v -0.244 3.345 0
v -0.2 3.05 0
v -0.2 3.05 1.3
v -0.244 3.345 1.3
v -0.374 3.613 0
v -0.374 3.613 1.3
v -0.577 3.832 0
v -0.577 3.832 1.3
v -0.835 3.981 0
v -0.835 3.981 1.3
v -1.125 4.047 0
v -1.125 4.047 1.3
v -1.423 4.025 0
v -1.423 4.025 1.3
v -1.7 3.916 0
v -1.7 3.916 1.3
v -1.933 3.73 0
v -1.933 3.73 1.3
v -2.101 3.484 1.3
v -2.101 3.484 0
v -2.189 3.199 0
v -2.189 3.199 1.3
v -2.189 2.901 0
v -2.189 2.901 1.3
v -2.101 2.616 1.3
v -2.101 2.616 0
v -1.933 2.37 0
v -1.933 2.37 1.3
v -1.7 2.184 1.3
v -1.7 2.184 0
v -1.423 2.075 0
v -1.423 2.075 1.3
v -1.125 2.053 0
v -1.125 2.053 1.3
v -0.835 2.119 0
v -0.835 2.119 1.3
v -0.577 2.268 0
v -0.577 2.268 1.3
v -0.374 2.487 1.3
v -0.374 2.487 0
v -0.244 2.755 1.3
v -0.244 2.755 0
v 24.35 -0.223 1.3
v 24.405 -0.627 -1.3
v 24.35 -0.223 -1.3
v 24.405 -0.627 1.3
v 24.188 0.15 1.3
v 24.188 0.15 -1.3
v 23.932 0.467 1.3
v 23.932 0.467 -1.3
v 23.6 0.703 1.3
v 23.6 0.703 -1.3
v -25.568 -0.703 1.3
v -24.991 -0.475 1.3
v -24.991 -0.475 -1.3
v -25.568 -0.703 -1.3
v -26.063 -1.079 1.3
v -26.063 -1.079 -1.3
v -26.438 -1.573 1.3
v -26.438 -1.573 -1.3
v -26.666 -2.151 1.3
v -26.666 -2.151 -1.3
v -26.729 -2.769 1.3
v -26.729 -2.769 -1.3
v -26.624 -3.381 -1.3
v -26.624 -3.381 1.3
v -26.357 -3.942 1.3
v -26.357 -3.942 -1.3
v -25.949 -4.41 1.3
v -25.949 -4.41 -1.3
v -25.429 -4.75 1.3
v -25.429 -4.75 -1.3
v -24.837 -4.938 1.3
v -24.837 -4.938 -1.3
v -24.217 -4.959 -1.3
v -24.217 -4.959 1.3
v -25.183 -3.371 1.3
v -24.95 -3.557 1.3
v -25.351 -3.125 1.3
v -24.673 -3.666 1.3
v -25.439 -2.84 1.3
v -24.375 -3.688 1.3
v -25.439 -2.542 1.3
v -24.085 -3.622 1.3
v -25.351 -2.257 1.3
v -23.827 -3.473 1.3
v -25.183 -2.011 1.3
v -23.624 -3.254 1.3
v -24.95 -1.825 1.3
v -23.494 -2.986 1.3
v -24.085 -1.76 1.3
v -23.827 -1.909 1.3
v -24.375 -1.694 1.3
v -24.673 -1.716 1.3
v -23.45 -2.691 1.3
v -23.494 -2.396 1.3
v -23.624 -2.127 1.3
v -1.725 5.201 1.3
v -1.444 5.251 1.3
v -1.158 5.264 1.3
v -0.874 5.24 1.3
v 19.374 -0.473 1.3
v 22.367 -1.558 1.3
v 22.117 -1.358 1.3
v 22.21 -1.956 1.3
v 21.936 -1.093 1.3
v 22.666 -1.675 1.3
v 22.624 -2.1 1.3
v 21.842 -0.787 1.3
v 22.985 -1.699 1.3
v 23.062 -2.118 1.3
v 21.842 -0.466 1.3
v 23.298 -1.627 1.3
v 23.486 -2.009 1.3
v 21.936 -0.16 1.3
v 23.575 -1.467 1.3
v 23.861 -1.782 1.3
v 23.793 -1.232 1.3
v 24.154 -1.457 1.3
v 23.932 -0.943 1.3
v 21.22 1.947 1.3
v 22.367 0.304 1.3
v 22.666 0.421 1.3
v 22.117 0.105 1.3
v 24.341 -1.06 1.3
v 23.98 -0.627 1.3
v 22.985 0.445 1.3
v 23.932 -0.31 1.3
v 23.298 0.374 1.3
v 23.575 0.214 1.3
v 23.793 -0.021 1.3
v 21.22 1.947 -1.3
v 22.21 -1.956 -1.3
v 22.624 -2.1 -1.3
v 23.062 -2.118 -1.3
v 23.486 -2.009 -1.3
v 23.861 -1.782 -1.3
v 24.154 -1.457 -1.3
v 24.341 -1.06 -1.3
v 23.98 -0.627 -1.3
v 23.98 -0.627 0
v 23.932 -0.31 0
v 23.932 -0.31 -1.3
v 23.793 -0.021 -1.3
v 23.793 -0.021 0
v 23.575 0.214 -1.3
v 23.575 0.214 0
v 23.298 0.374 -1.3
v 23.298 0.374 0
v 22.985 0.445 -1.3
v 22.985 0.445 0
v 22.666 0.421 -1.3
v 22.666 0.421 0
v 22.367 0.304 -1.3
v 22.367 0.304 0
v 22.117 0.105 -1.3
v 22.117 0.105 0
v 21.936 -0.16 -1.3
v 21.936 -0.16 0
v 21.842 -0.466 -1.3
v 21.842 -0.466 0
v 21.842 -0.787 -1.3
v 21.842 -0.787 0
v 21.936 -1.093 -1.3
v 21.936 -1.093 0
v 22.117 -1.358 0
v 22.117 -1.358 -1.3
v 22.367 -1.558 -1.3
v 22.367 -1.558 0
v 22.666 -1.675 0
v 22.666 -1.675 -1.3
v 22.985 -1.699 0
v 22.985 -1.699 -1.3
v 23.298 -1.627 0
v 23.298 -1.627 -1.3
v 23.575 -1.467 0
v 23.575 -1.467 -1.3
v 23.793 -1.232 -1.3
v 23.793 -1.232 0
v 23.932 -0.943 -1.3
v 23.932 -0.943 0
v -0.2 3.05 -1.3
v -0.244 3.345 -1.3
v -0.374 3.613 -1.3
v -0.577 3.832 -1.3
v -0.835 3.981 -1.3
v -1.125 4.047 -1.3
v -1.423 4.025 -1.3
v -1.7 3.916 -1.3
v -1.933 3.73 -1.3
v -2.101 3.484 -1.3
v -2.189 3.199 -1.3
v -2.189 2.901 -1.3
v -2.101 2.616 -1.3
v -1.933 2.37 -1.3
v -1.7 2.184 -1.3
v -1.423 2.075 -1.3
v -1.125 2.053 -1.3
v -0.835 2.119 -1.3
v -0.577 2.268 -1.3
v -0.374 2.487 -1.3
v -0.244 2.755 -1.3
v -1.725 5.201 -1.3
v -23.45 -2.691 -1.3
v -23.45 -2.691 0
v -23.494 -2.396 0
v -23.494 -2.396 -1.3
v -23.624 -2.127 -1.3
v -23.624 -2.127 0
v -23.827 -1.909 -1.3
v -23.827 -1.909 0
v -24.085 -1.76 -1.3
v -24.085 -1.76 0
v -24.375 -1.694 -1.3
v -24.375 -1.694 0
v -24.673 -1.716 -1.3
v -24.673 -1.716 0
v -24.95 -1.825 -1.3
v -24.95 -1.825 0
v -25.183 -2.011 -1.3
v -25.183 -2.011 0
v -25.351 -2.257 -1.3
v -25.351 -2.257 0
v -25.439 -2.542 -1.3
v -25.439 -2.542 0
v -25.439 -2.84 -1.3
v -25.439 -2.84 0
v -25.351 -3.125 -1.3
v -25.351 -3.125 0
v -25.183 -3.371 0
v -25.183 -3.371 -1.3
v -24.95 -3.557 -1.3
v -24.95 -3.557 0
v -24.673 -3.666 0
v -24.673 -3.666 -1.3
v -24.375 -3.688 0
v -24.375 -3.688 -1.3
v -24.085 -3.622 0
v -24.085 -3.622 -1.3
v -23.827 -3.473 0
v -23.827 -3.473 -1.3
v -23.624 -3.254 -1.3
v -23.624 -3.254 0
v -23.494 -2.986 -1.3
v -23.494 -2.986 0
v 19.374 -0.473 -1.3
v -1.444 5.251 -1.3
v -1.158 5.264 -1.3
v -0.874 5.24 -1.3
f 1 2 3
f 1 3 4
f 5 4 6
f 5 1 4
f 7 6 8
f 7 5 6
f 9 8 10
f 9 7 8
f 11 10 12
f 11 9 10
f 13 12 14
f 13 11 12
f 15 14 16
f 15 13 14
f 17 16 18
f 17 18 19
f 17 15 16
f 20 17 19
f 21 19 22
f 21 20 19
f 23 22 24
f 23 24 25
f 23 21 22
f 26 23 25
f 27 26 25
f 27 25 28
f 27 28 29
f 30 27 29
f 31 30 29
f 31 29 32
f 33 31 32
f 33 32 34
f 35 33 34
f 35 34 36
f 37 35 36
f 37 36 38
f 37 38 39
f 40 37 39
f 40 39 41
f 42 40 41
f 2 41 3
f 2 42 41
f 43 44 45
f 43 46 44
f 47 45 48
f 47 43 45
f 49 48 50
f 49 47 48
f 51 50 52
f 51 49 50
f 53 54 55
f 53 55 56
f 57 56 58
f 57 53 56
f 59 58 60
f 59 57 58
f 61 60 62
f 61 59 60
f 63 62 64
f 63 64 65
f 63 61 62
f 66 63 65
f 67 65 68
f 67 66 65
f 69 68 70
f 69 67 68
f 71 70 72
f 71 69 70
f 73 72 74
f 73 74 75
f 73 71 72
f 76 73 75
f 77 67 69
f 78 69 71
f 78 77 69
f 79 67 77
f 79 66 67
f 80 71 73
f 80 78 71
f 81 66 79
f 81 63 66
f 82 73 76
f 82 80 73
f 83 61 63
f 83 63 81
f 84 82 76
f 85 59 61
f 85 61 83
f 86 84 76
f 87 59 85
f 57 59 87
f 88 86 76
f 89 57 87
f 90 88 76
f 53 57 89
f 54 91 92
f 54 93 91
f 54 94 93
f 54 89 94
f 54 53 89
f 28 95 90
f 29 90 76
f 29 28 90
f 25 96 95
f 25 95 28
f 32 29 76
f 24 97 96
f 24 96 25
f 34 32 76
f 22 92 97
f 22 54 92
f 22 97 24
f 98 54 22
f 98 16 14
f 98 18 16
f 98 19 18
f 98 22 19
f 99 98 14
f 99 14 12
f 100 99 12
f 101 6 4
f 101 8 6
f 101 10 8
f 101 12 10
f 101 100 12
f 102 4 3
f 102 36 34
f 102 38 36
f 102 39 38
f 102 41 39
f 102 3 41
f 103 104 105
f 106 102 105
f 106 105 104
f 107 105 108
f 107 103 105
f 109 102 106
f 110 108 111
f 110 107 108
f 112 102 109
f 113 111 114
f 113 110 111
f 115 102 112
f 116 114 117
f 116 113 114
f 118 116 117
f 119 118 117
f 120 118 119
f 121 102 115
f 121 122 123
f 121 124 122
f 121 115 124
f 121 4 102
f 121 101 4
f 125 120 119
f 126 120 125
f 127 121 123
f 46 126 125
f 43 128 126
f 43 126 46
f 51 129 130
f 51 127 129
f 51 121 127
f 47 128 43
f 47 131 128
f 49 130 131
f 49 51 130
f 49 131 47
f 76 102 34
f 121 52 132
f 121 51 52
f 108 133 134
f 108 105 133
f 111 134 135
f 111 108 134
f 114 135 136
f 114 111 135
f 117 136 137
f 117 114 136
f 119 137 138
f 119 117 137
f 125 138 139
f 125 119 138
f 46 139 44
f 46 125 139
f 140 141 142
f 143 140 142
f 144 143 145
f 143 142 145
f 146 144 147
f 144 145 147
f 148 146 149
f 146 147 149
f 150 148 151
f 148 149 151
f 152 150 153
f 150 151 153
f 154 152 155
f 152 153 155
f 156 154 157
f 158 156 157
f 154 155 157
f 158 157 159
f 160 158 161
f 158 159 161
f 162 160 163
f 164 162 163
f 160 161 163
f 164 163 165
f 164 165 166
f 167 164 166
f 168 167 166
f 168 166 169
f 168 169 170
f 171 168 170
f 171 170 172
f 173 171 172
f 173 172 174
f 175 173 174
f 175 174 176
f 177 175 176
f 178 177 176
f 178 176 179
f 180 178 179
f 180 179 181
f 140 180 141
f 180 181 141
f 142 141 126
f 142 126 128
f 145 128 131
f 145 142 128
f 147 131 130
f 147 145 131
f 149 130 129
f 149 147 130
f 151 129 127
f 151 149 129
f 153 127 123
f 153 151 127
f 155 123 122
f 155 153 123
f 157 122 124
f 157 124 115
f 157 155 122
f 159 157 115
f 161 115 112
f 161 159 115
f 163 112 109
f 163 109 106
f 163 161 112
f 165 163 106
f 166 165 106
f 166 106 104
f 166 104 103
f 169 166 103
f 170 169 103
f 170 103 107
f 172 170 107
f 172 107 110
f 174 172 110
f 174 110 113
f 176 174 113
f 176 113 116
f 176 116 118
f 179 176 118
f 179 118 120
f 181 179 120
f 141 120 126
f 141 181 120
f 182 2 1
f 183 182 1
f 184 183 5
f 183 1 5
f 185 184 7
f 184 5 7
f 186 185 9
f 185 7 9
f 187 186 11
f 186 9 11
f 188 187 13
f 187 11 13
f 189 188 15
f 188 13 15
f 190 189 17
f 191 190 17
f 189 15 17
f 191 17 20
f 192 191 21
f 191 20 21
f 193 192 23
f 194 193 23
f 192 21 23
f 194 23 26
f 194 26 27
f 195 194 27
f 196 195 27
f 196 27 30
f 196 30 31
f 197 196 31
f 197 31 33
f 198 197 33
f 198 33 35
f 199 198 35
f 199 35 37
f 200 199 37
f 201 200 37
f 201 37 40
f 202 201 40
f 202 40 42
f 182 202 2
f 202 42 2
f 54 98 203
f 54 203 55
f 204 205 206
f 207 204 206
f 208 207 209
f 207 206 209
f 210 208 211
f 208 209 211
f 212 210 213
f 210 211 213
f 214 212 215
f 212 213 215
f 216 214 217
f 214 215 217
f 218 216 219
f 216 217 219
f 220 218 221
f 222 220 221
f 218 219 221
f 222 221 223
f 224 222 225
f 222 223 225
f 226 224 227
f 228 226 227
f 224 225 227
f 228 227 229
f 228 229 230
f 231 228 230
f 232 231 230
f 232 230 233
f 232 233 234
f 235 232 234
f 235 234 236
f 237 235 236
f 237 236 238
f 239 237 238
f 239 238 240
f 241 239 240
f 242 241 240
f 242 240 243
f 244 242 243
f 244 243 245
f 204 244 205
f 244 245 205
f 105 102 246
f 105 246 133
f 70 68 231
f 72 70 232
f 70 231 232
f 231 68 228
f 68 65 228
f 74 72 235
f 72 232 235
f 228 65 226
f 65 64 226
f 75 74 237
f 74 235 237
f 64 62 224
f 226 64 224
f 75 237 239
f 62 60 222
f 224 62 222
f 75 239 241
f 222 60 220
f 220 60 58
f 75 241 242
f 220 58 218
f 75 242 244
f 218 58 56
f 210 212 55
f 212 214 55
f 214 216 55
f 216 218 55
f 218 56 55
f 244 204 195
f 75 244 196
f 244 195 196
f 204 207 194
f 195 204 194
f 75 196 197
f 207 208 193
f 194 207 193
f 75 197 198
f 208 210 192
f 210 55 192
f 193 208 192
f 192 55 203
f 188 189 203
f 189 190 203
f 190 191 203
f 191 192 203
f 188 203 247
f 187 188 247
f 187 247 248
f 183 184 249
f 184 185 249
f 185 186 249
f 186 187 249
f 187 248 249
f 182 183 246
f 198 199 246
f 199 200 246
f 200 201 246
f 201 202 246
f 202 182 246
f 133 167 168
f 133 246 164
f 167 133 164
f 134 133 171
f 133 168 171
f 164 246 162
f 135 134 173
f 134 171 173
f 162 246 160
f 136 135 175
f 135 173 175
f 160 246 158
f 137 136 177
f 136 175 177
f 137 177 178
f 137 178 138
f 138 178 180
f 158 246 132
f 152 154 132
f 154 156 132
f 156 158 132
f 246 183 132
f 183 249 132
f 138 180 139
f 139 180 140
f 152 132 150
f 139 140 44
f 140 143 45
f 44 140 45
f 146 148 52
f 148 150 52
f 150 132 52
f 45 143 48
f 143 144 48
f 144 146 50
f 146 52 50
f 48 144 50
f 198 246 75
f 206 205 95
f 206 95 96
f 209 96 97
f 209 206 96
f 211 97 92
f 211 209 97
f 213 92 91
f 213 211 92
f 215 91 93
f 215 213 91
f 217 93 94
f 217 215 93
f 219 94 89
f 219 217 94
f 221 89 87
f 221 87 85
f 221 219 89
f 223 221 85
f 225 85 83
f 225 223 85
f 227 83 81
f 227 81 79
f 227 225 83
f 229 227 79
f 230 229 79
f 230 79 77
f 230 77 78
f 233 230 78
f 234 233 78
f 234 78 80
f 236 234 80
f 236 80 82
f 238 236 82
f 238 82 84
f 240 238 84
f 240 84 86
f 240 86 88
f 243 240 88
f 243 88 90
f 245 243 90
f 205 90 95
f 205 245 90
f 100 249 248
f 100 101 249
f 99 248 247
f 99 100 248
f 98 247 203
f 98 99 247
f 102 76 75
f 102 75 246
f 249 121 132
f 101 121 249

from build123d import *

# Parameters (mm, degrees)
F0_R     = 1
F0_R_2   = 1.075
F1_DEPTH = 1.3


with BuildPart() as f1:
    # F0 (on Top) → F1 (new body)
    with BuildSketch(Plane.XY):
        with BuildLine():
            ThreePointArc((-1.724839, 5.20118), (-2.567642, 1.308568), (1.014279, 3.05))
            ThreePointArc((1.014279, 3.05), (0.477178, 4.49572), (-0.873565, 5.240085))
            ThreePointArc((-0.873565, 5.240085), (-1.301091, 5.26197), (-1.724839, 5.20118))
        make_face()
        with Locations((-1.2, 3.05)):
            Circle(F0_R, mode=Mode.SUBTRACT)
        with BuildLine():
            ThreePointArc((-0.873565, 5.240085), (0.477178, 4.49572), (1.014279, 3.05))
            ThreePointArc((1.014279, 3.05), (-2.567642, 1.308568), (-1.724839, 5.20118))
            Line((-1.724839, 5.20118), (-24.990567, -0.475129))
            ThreePointArc((-24.990567, -0.475129), (-23.041374, -0.897155), (-22.169366, -2.690773))
            ThreePointArc((-22.169366, -2.690773), (-22.75681, -4.218646), (-24.216514, -4.959423))
            Line((-24.216514, -4.959423), (19.374011, -0.473151))
            Line((19.374011, -0.473151), (22.209785, -1.955847))
            ThreePointArc((22.209785, -1.955847), (21.57553, 0.068436), (23.599812, 0.702691))
            Line((23.599812, 0.702691), (21.219947, 1.947013))
            Line((21.219947, 1.947013), (-0.873565, 5.240085))
        make_face()
        with BuildLine():
            ThreePointArc((-22.169366, -2.690773), (-23.041374, -0.897155), (-24.990567, -0.475129))
            ThreePointArc((-24.990567, -0.475129), (-26.697398, -3.078706), (-24.216514, -4.959423))
            ThreePointArc((-24.216514, -4.959423), (-22.75681, -4.218646), (-22.169366, -2.690773))
        make_face()
        with Locations((-24.45, -2.690773)):
            Circle(F0_R, mode=Mode.SUBTRACT)
        with BuildLine():
            ThreePointArc((24.404799, -0.626578), (24.187865, 0.150429), (23.599812, 0.702691))
            ThreePointArc((23.599812, 0.702691), (21.57553, 0.068436), (22.209785, -1.955847))
            ThreePointArc((22.209785, -1.955847), (23.681806, -1.909645), (24.404799, -0.626578))
        make_face()
        with Locations((22.904799, -0.626578)):
            Circle(F0_R_2, mode=Mode.SUBTRACT)
    extrude(amount=F1_DEPTH)

    # F2: F1 across plane


with BuildPart() as f1_1:
    add(f1.part)
    add(f1.part.mirror(Plane.XY))


solid = f1_1.part
